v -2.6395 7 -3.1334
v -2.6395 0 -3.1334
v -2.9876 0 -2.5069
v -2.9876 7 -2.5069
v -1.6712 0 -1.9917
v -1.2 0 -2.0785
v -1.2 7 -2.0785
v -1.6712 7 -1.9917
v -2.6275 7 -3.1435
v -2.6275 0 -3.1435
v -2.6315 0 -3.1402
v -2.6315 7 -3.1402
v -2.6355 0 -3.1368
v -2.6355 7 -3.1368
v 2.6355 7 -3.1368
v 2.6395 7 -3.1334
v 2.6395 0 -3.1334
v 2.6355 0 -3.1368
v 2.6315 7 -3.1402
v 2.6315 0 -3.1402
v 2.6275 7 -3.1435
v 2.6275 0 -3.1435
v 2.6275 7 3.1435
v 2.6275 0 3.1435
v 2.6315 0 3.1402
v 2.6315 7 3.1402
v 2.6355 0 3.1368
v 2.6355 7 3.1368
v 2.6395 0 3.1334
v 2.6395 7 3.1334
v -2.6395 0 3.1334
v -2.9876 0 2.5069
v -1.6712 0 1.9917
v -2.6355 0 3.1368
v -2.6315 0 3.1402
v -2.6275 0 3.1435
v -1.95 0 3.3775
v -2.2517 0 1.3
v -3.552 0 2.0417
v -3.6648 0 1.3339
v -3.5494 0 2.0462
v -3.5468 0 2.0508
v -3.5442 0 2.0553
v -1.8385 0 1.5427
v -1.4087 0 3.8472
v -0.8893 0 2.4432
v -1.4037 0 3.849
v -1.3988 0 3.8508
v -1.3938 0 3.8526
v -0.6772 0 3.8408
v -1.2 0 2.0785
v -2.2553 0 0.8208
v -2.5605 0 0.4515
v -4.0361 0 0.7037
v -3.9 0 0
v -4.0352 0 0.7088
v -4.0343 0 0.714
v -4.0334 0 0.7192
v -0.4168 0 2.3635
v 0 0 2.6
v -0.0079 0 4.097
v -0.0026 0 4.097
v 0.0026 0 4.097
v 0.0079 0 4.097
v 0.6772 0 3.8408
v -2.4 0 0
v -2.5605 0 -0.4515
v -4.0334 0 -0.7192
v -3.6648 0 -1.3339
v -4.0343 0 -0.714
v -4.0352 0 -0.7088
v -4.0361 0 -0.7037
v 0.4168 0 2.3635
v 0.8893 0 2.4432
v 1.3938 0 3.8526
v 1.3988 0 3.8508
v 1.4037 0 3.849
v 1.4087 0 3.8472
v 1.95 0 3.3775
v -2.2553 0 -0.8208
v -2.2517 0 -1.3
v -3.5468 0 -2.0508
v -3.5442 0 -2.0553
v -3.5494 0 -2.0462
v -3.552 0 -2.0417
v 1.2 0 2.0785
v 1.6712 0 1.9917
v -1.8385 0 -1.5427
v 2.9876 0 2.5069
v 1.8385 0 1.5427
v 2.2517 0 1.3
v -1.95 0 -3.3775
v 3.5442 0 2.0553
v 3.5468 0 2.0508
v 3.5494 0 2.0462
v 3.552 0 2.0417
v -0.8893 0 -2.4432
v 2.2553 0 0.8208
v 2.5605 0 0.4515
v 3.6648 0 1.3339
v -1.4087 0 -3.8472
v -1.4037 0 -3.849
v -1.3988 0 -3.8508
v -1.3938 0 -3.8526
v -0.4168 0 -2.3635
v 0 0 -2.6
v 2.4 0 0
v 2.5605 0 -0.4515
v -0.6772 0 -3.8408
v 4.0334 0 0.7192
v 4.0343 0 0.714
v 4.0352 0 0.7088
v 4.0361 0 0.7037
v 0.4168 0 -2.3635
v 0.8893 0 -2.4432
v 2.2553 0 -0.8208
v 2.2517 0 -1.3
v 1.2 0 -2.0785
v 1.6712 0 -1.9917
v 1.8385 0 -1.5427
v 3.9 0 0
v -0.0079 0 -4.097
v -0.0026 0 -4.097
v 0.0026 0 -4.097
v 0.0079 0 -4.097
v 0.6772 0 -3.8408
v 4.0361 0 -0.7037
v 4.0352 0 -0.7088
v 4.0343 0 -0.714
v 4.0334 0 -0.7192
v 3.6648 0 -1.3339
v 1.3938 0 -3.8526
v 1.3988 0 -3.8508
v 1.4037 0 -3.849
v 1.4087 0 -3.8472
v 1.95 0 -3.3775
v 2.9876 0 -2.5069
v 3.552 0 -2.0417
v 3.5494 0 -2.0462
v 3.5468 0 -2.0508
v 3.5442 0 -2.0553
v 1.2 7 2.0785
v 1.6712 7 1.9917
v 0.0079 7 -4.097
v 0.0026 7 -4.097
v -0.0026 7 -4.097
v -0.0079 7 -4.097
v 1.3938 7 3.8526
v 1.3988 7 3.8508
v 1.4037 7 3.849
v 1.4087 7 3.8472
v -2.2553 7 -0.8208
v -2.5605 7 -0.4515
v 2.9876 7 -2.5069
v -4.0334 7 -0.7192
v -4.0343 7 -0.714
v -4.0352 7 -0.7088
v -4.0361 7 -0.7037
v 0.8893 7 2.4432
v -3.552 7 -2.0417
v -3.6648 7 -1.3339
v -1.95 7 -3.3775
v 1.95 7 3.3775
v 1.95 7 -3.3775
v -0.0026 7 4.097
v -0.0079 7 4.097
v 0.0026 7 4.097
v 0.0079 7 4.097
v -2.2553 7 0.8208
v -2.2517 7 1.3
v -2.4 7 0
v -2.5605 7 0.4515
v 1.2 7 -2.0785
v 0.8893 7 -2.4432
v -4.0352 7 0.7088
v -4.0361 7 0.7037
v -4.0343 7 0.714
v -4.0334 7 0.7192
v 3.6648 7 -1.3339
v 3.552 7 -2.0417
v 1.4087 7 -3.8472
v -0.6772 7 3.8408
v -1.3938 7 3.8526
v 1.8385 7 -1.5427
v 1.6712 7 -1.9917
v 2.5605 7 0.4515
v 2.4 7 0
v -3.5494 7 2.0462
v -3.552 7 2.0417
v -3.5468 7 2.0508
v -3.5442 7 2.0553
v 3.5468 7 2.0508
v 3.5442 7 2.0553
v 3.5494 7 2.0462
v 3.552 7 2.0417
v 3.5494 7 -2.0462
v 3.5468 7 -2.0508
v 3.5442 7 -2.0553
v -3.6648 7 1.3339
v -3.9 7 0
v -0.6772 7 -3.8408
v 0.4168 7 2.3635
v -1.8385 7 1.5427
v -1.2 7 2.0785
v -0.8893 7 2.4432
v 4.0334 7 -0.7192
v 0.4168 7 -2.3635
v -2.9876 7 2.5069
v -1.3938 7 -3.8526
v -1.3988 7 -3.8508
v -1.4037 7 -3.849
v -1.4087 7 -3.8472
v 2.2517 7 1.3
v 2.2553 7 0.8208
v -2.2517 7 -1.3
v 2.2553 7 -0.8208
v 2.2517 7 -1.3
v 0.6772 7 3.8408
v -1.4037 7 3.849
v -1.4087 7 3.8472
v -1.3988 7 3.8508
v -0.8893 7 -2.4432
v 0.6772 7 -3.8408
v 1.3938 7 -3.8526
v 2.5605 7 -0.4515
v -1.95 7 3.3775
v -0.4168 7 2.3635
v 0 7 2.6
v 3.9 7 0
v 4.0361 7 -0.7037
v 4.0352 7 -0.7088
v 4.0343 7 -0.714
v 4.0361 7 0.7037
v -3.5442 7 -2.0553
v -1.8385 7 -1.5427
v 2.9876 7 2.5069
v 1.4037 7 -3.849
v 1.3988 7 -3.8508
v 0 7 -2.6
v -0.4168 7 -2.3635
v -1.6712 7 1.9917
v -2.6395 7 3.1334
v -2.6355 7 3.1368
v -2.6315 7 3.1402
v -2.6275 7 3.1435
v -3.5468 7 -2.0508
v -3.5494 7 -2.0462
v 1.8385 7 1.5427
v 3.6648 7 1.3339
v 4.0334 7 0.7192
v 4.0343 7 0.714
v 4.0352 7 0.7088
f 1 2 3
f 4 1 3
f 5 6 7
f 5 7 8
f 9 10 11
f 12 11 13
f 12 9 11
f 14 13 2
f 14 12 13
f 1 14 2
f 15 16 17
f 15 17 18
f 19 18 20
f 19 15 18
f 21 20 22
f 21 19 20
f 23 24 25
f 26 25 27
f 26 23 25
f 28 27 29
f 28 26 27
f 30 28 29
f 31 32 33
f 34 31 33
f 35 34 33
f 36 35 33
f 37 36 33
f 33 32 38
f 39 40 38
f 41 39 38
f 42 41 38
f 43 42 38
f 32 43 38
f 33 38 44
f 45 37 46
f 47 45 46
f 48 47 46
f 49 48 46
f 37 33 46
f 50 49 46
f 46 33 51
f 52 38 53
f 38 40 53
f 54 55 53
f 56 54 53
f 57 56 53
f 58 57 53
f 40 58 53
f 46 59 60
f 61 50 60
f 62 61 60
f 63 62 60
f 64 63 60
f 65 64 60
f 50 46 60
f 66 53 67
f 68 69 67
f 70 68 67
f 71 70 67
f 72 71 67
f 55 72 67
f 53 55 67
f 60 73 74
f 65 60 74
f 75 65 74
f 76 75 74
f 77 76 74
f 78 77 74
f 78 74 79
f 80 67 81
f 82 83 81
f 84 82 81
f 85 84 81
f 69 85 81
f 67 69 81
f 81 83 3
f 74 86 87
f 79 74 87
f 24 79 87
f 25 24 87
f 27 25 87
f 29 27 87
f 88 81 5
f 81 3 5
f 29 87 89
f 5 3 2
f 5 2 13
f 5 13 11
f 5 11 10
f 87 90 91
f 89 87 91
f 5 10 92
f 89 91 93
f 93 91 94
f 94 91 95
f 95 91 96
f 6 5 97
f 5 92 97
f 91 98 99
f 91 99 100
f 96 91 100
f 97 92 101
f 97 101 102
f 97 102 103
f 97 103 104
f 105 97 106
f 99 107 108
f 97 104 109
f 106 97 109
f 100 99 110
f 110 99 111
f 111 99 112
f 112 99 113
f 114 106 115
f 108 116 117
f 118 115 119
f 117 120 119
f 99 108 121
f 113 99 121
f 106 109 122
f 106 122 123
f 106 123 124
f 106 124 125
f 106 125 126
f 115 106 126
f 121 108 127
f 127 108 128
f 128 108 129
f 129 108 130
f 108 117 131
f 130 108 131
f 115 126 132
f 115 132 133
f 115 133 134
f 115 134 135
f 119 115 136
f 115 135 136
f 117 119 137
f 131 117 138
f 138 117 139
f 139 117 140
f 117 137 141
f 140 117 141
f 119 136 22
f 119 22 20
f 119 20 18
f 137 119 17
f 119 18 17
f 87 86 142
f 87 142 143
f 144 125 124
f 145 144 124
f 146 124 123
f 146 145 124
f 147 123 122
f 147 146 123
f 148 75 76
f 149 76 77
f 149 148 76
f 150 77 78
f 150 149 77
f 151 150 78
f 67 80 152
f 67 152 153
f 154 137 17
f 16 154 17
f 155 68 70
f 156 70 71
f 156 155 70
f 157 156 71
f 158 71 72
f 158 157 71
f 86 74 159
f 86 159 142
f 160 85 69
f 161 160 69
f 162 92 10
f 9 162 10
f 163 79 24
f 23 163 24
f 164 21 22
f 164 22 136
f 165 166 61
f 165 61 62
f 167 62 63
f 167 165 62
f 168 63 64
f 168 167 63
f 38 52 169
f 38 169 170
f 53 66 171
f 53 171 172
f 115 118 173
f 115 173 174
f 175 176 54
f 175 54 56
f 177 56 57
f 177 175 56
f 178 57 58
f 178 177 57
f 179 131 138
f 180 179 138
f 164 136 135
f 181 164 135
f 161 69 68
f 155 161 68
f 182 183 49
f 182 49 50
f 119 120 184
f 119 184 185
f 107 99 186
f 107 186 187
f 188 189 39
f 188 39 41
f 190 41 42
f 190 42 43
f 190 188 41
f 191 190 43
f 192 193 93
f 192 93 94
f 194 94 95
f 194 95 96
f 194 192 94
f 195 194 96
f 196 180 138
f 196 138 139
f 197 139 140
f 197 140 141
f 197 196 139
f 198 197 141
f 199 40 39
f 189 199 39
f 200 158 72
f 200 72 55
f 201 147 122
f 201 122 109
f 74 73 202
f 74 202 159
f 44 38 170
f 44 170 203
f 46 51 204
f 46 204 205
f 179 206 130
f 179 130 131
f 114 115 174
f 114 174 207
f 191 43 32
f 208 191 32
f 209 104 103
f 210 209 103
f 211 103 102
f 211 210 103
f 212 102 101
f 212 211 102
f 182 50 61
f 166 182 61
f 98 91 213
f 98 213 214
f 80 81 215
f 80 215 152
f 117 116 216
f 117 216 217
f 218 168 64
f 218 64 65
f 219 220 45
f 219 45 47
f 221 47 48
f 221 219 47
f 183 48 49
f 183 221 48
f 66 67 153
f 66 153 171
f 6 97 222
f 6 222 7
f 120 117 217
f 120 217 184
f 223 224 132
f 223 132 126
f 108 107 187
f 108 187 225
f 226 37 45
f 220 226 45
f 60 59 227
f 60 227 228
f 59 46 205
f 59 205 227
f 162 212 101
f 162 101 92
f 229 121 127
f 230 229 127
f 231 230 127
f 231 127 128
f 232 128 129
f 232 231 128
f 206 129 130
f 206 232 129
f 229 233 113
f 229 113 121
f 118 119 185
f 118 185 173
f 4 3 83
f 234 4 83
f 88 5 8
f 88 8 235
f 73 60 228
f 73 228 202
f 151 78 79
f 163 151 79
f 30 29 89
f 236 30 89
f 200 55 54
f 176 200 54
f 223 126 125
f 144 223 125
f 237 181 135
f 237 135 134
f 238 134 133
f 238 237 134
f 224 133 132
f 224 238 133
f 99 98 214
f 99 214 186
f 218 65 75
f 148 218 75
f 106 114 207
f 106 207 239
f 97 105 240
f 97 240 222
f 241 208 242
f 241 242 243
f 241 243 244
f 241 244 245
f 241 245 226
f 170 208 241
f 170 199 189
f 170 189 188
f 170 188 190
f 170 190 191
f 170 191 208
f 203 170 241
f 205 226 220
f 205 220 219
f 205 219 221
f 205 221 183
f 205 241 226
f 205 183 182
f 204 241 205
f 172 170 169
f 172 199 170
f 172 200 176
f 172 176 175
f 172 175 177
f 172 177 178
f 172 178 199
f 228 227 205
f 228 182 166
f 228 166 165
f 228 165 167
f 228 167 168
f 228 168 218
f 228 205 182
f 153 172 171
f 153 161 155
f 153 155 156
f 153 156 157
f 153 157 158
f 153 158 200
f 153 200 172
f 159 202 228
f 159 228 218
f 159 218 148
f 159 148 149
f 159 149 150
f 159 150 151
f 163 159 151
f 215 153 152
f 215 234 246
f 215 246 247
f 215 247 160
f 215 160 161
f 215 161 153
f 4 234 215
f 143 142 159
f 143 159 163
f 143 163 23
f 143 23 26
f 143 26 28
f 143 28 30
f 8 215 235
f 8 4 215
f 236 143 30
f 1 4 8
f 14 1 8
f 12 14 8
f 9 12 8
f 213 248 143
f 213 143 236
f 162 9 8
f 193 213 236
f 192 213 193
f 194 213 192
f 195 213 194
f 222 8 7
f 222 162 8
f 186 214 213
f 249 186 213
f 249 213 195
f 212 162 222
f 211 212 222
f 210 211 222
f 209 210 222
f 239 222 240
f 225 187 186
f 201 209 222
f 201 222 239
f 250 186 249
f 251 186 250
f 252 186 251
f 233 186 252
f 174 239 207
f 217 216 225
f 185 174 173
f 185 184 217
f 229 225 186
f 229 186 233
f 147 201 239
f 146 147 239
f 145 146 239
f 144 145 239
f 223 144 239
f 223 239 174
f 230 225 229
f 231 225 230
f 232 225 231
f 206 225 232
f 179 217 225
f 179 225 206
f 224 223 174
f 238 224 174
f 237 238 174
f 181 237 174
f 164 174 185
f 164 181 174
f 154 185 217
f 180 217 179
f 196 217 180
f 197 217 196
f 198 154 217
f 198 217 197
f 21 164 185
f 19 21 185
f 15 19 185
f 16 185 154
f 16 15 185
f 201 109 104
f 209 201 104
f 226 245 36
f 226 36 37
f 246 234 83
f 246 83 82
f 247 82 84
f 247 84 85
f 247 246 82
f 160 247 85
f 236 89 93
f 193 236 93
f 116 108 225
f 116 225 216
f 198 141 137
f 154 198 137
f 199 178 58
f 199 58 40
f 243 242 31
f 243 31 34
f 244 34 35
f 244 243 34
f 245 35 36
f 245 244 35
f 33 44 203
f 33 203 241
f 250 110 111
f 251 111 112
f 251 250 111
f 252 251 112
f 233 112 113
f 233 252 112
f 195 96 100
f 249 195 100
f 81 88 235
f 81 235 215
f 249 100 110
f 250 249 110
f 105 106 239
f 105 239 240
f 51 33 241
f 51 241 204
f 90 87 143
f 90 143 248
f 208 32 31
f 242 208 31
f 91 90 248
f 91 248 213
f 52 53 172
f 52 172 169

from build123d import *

# Parameters (mm, degrees)
BOSS_EXTRUDE1_DEPTH = 7
SKETCH2_R           = 5.515074568
SKETCH2_R_2         = 4.096991853
CUT_EXTRUDE1_DEPTH  = 10


with BuildPart() as part:
    # Sketch1 → Boss-Extrude1 (new body)
    with BuildSketch(Plane(origin=(0, 0, 0), x_dir=(1, 0, 0), z_dir=(0, 1, 0))):
        Polygon((0, 4.1), (-0.677227893, 3.840750237), (-1.402282588, 3.852739745), (-1.95, 3.377499075), (-2.6354292, 3.140782217), (-2.987573328, 2.506871678), (-3.550704156, 2.05), (-3.664801221, 1.333878559), (-4.037711787, 0.711957528), (-3.9, 0), (-4.037711787, -0.711957528), (-3.664801221, -1.333878559), (-3.550704156, -2.05), (-2.987573328, -2.506871678), (-2.6354292, -3.140782217), (-1.95, -3.377499075), (-1.402282588, -3.852739745), (-0.677227893, -3.840750237), (0, -4.1), (0.677227893, -3.840750237), (1.402282588, -3.852739745), (1.95, -3.377499075), (2.6354292, -3.140782217), (2.987573328, -2.506871678), (3.550704156, -2.05), (3.664801221, -1.333878559), (4.037711787, -0.711957528), (3.9, 0), (4.037711787, 0.711957528), (3.664801221, 1.333878559), (3.550704156, 2.05), (2.987573328, 2.506871678), (2.6354292, 3.140782217), (1.95, 3.377499075), (1.402282588, 3.852739745), (0.677227893, 3.840750237), align=None)
        Polygon((0, 2.6), (-0.416755626, 2.363538607), (-0.889252373, 2.443200814), (-1.2, 2.078460969), (-1.671247785, 1.991715552), (-1.838506663, 1.542690263), (-2.25166605, 1.3), (-2.25526229, 0.820848344), (-2.560500158, 0.451485262), (-2.4, 0), (-2.560500158, -0.451485262), (-2.25526229, -0.820848344), (-2.25166605, -1.3), (-1.838506663, -1.542690263), (-1.671247785, -1.991715552), (-1.2, -2.078460969), (-0.889252373, -2.443200814), (-0.416755626, -2.363538607), (0, -2.6), (0.416755626, -2.363538607), (0.889252373, -2.443200814), (1.2, -2.078460969), (1.671247785, -1.991715552), (1.838506663, -1.542690263), (2.25166605, -1.3), (2.25526229, -0.820848344), (2.560500158, -0.451485262), (2.4, 0), (2.560500158, 0.451485262), (2.25526229, 0.820848344), (2.25166605, 1.3), (1.838506663, 1.542690263), (1.671247785, 1.991715552), (1.2, 2.078460969), (0.889252373, 2.443200814), (0.416755626, 2.363538607), align=None, mode=Mode.SUBTRACT)
    extrude(amount=BOSS_EXTRUDE1_DEPTH)

    # Sketch2 → Cut-Extrude1 (cut)
    with BuildSketch(Plane(origin=(0, 7, 0), x_dir=(1, 0, 0), z_dir=(0, 1, 0))):
        Circle(SKETCH2_R)
        Circle(SKETCH2_R_2, mode=Mode.SUBTRACT)
    extrude(amount=-CUT_EXTRUDE1_DEPTH, mode=Mode.SUBTRACT)


solid = part.part
